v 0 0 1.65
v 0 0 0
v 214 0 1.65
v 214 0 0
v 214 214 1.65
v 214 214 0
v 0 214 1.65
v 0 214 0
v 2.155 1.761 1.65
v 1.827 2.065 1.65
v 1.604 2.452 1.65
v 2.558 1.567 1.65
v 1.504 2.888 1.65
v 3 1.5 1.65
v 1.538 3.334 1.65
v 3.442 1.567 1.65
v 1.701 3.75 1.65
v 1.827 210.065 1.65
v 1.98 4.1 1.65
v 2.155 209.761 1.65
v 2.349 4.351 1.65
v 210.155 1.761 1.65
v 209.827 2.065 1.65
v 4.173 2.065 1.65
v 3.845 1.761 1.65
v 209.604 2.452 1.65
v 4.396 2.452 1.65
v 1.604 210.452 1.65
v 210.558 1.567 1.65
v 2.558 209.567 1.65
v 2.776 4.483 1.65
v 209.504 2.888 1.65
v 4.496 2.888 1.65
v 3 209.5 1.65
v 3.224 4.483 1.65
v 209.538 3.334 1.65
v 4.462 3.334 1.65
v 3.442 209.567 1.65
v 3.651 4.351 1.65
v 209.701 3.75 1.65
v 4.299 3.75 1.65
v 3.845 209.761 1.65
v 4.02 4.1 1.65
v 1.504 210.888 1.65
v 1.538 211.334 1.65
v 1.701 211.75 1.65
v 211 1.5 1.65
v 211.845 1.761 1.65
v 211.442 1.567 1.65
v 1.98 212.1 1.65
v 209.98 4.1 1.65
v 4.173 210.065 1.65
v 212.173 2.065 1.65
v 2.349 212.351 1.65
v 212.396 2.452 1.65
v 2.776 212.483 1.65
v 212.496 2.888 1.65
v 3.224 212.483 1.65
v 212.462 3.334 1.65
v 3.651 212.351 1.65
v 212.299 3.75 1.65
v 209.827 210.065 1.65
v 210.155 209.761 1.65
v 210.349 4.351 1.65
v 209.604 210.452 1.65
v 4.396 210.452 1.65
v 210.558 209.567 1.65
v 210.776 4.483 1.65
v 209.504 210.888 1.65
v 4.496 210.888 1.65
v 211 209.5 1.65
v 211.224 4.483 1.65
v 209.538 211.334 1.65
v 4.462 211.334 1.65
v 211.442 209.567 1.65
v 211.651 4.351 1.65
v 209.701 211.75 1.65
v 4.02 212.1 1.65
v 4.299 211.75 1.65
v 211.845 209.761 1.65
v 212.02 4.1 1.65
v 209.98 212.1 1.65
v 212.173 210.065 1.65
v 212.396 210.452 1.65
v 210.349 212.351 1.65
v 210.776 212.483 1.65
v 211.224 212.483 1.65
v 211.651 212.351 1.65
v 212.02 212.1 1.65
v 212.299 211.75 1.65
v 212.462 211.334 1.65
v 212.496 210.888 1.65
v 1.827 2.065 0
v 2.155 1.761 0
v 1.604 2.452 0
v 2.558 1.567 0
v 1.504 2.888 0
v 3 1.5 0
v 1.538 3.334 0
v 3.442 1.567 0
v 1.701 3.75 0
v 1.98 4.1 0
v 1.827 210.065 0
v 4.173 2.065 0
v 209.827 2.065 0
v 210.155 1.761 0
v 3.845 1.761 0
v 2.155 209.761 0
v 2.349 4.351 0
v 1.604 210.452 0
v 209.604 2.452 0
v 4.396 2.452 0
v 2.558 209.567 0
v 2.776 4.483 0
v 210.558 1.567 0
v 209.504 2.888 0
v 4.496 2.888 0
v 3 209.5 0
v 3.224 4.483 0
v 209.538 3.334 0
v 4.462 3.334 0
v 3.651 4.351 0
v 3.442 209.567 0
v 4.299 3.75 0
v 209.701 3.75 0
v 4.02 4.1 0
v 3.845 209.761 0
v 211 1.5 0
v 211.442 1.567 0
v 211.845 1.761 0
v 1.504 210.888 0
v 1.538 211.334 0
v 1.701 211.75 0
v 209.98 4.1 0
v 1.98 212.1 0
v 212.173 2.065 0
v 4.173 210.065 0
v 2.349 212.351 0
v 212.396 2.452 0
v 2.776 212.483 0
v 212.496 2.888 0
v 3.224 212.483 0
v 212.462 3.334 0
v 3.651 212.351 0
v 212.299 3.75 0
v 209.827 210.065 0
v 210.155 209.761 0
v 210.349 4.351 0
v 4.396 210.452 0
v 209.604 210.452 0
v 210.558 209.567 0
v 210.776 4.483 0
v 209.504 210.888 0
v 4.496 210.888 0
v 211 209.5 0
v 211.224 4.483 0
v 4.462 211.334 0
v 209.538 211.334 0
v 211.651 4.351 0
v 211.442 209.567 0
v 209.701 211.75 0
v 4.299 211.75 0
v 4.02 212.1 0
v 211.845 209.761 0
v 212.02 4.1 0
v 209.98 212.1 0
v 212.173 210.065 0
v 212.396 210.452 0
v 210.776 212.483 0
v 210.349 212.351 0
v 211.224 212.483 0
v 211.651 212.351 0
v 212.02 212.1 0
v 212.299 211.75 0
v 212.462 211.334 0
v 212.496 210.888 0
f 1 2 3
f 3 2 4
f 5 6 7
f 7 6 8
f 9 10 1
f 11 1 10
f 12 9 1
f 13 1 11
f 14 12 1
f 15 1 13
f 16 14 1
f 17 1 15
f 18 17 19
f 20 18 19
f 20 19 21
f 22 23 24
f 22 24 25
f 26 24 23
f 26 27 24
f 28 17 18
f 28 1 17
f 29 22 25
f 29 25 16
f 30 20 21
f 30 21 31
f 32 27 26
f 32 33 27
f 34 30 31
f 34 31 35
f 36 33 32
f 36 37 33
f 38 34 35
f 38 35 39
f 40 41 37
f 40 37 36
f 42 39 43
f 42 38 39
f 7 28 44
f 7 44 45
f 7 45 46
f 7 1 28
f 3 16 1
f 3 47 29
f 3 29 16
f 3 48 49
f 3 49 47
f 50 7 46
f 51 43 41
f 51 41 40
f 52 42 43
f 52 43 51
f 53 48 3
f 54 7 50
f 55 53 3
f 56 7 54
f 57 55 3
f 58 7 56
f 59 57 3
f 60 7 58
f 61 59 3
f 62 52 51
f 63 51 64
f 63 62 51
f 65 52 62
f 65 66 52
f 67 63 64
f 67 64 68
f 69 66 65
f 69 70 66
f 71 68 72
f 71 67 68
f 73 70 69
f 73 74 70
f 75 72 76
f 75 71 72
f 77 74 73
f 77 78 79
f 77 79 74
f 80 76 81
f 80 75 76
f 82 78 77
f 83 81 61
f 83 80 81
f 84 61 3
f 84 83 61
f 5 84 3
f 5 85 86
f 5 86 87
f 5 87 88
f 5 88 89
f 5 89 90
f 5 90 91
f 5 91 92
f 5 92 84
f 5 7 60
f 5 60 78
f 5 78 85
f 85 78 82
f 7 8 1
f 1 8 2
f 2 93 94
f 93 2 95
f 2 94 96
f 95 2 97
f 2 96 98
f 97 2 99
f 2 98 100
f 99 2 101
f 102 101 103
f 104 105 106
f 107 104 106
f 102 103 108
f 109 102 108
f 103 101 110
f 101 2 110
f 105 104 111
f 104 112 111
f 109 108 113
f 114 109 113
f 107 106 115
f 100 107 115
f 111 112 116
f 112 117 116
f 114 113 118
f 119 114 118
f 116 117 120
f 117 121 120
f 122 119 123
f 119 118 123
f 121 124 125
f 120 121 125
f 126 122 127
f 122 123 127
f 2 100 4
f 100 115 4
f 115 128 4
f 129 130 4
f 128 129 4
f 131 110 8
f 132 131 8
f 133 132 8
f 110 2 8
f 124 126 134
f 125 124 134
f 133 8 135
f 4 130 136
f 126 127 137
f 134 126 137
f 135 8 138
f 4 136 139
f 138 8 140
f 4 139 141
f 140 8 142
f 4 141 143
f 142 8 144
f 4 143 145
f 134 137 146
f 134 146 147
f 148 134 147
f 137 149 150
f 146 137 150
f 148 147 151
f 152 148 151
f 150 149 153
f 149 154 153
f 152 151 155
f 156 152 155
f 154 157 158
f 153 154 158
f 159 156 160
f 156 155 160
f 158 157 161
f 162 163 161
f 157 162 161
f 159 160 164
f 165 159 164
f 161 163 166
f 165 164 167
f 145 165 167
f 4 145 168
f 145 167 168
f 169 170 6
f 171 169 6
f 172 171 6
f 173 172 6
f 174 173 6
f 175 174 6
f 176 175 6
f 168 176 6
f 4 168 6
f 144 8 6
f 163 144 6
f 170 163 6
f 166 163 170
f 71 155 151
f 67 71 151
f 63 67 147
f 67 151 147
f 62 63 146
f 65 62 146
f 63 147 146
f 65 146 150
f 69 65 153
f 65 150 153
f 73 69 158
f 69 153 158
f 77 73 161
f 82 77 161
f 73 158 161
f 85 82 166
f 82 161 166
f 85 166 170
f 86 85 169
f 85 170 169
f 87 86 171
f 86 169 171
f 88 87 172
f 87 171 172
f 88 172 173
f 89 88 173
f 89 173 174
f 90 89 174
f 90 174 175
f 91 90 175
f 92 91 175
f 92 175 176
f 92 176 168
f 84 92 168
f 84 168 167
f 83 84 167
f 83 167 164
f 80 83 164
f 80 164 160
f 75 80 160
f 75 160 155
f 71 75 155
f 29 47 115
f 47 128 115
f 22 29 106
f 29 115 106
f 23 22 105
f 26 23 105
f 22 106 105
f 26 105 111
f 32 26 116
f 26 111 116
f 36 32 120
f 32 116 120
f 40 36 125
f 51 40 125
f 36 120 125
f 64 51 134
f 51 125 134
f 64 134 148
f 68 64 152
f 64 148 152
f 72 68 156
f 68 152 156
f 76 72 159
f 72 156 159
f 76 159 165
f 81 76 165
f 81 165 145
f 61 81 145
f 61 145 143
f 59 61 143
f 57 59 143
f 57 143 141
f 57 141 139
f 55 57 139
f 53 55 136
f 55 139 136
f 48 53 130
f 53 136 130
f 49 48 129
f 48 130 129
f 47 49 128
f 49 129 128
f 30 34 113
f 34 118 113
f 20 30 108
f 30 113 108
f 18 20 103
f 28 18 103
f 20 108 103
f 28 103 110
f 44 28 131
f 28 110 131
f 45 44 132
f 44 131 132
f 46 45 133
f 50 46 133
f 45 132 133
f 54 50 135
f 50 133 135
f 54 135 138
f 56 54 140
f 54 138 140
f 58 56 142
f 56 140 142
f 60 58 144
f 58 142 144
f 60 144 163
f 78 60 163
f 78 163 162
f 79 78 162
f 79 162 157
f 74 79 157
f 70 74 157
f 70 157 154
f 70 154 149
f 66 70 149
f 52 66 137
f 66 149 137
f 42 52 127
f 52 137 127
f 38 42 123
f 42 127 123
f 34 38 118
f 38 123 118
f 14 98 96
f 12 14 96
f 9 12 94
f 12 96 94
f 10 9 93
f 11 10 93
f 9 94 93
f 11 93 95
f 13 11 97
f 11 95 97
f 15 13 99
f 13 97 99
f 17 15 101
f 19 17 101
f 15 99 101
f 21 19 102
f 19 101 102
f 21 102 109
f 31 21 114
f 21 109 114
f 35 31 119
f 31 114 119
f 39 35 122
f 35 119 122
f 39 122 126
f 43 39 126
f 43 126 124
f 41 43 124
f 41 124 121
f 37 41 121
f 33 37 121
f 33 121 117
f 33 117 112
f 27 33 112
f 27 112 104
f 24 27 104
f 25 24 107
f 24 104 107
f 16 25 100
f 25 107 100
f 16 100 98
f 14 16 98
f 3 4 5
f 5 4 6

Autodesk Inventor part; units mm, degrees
ref_plane "YZ Plane" through (0, 0, 0) normal (1, 0, 0) x (0, 1, 0)
ref_plane "XZ Plane" through (0, 0, 0) normal (0, 1, 0) x (-1, 0, 0)
ref_plane "XY Plane" through (0, 0, 0) normal (0, 0, 1) x (1, 0, 0)
sketch "Sketch3" plane through (0, 0, 0) normal (0, 0, 1) x (1, 0, 0)
  line L0 (0, 0) -> (214, 0)
  line L1 (214, 0) -> (214, 214)
  line L2 (214, 214) -> (0, 214)
  line L3 (0, 214) -> (0, 0)
  dimension "d2" = 214
  dimension "d3" = 214
extrude "Extrusion1" add sketch "Sketch3" along normal blind 1.65
sketch "Sketch4" plane through (0, 0, 1.65) normal (0, 0, 1) x (1, 0, 0)
  line L0 (0.5008, 209.7083) -> (213.5162, 209.7083)
  line L1 (213.5162, 209.7083) -> (213.5162, 5.2135)
  line L2 (213.5162, 5.2135) -> (0.5008, 5.2135)
  line L3 (0.5008, 5.2135) -> (0.5008, 209.7083)
sketch "Sketch5" plane through (0, 0, 1.65) normal (0, 0, 1) x (1, 0, 0)
  line L0 (214, 214) -> (0, 214) projected
  line L1 (0, 214) -> (0, 0) projected
  line L2 (214, 0) -> (214, 214) projected
  line L3 (0, 0) -> (214, 0) projected
  point P0 (3, 3)
  point P1 (211, 3)
  point P2 (211, 211)
  point P3 (3, 211)
  dimension "d41" = 3
  dimension "d42" = 3
  dimension "d43" = 3
  dimension "d44" = 3
  dimension "d45" = 3
  dimension "d46" = 3
  dimension "d47" = 3
  dimension "d48" = 3
hole "Hole1" at (3, 211, 1.65) at (3, 3, 1.65) at (211, 3, 1.65) at (211, 211, 1.65) direction (0, 0, -1) diameter 3 depth 25.4 tip angle 118
properties part number "200x200 RepRap Heated Bed"
